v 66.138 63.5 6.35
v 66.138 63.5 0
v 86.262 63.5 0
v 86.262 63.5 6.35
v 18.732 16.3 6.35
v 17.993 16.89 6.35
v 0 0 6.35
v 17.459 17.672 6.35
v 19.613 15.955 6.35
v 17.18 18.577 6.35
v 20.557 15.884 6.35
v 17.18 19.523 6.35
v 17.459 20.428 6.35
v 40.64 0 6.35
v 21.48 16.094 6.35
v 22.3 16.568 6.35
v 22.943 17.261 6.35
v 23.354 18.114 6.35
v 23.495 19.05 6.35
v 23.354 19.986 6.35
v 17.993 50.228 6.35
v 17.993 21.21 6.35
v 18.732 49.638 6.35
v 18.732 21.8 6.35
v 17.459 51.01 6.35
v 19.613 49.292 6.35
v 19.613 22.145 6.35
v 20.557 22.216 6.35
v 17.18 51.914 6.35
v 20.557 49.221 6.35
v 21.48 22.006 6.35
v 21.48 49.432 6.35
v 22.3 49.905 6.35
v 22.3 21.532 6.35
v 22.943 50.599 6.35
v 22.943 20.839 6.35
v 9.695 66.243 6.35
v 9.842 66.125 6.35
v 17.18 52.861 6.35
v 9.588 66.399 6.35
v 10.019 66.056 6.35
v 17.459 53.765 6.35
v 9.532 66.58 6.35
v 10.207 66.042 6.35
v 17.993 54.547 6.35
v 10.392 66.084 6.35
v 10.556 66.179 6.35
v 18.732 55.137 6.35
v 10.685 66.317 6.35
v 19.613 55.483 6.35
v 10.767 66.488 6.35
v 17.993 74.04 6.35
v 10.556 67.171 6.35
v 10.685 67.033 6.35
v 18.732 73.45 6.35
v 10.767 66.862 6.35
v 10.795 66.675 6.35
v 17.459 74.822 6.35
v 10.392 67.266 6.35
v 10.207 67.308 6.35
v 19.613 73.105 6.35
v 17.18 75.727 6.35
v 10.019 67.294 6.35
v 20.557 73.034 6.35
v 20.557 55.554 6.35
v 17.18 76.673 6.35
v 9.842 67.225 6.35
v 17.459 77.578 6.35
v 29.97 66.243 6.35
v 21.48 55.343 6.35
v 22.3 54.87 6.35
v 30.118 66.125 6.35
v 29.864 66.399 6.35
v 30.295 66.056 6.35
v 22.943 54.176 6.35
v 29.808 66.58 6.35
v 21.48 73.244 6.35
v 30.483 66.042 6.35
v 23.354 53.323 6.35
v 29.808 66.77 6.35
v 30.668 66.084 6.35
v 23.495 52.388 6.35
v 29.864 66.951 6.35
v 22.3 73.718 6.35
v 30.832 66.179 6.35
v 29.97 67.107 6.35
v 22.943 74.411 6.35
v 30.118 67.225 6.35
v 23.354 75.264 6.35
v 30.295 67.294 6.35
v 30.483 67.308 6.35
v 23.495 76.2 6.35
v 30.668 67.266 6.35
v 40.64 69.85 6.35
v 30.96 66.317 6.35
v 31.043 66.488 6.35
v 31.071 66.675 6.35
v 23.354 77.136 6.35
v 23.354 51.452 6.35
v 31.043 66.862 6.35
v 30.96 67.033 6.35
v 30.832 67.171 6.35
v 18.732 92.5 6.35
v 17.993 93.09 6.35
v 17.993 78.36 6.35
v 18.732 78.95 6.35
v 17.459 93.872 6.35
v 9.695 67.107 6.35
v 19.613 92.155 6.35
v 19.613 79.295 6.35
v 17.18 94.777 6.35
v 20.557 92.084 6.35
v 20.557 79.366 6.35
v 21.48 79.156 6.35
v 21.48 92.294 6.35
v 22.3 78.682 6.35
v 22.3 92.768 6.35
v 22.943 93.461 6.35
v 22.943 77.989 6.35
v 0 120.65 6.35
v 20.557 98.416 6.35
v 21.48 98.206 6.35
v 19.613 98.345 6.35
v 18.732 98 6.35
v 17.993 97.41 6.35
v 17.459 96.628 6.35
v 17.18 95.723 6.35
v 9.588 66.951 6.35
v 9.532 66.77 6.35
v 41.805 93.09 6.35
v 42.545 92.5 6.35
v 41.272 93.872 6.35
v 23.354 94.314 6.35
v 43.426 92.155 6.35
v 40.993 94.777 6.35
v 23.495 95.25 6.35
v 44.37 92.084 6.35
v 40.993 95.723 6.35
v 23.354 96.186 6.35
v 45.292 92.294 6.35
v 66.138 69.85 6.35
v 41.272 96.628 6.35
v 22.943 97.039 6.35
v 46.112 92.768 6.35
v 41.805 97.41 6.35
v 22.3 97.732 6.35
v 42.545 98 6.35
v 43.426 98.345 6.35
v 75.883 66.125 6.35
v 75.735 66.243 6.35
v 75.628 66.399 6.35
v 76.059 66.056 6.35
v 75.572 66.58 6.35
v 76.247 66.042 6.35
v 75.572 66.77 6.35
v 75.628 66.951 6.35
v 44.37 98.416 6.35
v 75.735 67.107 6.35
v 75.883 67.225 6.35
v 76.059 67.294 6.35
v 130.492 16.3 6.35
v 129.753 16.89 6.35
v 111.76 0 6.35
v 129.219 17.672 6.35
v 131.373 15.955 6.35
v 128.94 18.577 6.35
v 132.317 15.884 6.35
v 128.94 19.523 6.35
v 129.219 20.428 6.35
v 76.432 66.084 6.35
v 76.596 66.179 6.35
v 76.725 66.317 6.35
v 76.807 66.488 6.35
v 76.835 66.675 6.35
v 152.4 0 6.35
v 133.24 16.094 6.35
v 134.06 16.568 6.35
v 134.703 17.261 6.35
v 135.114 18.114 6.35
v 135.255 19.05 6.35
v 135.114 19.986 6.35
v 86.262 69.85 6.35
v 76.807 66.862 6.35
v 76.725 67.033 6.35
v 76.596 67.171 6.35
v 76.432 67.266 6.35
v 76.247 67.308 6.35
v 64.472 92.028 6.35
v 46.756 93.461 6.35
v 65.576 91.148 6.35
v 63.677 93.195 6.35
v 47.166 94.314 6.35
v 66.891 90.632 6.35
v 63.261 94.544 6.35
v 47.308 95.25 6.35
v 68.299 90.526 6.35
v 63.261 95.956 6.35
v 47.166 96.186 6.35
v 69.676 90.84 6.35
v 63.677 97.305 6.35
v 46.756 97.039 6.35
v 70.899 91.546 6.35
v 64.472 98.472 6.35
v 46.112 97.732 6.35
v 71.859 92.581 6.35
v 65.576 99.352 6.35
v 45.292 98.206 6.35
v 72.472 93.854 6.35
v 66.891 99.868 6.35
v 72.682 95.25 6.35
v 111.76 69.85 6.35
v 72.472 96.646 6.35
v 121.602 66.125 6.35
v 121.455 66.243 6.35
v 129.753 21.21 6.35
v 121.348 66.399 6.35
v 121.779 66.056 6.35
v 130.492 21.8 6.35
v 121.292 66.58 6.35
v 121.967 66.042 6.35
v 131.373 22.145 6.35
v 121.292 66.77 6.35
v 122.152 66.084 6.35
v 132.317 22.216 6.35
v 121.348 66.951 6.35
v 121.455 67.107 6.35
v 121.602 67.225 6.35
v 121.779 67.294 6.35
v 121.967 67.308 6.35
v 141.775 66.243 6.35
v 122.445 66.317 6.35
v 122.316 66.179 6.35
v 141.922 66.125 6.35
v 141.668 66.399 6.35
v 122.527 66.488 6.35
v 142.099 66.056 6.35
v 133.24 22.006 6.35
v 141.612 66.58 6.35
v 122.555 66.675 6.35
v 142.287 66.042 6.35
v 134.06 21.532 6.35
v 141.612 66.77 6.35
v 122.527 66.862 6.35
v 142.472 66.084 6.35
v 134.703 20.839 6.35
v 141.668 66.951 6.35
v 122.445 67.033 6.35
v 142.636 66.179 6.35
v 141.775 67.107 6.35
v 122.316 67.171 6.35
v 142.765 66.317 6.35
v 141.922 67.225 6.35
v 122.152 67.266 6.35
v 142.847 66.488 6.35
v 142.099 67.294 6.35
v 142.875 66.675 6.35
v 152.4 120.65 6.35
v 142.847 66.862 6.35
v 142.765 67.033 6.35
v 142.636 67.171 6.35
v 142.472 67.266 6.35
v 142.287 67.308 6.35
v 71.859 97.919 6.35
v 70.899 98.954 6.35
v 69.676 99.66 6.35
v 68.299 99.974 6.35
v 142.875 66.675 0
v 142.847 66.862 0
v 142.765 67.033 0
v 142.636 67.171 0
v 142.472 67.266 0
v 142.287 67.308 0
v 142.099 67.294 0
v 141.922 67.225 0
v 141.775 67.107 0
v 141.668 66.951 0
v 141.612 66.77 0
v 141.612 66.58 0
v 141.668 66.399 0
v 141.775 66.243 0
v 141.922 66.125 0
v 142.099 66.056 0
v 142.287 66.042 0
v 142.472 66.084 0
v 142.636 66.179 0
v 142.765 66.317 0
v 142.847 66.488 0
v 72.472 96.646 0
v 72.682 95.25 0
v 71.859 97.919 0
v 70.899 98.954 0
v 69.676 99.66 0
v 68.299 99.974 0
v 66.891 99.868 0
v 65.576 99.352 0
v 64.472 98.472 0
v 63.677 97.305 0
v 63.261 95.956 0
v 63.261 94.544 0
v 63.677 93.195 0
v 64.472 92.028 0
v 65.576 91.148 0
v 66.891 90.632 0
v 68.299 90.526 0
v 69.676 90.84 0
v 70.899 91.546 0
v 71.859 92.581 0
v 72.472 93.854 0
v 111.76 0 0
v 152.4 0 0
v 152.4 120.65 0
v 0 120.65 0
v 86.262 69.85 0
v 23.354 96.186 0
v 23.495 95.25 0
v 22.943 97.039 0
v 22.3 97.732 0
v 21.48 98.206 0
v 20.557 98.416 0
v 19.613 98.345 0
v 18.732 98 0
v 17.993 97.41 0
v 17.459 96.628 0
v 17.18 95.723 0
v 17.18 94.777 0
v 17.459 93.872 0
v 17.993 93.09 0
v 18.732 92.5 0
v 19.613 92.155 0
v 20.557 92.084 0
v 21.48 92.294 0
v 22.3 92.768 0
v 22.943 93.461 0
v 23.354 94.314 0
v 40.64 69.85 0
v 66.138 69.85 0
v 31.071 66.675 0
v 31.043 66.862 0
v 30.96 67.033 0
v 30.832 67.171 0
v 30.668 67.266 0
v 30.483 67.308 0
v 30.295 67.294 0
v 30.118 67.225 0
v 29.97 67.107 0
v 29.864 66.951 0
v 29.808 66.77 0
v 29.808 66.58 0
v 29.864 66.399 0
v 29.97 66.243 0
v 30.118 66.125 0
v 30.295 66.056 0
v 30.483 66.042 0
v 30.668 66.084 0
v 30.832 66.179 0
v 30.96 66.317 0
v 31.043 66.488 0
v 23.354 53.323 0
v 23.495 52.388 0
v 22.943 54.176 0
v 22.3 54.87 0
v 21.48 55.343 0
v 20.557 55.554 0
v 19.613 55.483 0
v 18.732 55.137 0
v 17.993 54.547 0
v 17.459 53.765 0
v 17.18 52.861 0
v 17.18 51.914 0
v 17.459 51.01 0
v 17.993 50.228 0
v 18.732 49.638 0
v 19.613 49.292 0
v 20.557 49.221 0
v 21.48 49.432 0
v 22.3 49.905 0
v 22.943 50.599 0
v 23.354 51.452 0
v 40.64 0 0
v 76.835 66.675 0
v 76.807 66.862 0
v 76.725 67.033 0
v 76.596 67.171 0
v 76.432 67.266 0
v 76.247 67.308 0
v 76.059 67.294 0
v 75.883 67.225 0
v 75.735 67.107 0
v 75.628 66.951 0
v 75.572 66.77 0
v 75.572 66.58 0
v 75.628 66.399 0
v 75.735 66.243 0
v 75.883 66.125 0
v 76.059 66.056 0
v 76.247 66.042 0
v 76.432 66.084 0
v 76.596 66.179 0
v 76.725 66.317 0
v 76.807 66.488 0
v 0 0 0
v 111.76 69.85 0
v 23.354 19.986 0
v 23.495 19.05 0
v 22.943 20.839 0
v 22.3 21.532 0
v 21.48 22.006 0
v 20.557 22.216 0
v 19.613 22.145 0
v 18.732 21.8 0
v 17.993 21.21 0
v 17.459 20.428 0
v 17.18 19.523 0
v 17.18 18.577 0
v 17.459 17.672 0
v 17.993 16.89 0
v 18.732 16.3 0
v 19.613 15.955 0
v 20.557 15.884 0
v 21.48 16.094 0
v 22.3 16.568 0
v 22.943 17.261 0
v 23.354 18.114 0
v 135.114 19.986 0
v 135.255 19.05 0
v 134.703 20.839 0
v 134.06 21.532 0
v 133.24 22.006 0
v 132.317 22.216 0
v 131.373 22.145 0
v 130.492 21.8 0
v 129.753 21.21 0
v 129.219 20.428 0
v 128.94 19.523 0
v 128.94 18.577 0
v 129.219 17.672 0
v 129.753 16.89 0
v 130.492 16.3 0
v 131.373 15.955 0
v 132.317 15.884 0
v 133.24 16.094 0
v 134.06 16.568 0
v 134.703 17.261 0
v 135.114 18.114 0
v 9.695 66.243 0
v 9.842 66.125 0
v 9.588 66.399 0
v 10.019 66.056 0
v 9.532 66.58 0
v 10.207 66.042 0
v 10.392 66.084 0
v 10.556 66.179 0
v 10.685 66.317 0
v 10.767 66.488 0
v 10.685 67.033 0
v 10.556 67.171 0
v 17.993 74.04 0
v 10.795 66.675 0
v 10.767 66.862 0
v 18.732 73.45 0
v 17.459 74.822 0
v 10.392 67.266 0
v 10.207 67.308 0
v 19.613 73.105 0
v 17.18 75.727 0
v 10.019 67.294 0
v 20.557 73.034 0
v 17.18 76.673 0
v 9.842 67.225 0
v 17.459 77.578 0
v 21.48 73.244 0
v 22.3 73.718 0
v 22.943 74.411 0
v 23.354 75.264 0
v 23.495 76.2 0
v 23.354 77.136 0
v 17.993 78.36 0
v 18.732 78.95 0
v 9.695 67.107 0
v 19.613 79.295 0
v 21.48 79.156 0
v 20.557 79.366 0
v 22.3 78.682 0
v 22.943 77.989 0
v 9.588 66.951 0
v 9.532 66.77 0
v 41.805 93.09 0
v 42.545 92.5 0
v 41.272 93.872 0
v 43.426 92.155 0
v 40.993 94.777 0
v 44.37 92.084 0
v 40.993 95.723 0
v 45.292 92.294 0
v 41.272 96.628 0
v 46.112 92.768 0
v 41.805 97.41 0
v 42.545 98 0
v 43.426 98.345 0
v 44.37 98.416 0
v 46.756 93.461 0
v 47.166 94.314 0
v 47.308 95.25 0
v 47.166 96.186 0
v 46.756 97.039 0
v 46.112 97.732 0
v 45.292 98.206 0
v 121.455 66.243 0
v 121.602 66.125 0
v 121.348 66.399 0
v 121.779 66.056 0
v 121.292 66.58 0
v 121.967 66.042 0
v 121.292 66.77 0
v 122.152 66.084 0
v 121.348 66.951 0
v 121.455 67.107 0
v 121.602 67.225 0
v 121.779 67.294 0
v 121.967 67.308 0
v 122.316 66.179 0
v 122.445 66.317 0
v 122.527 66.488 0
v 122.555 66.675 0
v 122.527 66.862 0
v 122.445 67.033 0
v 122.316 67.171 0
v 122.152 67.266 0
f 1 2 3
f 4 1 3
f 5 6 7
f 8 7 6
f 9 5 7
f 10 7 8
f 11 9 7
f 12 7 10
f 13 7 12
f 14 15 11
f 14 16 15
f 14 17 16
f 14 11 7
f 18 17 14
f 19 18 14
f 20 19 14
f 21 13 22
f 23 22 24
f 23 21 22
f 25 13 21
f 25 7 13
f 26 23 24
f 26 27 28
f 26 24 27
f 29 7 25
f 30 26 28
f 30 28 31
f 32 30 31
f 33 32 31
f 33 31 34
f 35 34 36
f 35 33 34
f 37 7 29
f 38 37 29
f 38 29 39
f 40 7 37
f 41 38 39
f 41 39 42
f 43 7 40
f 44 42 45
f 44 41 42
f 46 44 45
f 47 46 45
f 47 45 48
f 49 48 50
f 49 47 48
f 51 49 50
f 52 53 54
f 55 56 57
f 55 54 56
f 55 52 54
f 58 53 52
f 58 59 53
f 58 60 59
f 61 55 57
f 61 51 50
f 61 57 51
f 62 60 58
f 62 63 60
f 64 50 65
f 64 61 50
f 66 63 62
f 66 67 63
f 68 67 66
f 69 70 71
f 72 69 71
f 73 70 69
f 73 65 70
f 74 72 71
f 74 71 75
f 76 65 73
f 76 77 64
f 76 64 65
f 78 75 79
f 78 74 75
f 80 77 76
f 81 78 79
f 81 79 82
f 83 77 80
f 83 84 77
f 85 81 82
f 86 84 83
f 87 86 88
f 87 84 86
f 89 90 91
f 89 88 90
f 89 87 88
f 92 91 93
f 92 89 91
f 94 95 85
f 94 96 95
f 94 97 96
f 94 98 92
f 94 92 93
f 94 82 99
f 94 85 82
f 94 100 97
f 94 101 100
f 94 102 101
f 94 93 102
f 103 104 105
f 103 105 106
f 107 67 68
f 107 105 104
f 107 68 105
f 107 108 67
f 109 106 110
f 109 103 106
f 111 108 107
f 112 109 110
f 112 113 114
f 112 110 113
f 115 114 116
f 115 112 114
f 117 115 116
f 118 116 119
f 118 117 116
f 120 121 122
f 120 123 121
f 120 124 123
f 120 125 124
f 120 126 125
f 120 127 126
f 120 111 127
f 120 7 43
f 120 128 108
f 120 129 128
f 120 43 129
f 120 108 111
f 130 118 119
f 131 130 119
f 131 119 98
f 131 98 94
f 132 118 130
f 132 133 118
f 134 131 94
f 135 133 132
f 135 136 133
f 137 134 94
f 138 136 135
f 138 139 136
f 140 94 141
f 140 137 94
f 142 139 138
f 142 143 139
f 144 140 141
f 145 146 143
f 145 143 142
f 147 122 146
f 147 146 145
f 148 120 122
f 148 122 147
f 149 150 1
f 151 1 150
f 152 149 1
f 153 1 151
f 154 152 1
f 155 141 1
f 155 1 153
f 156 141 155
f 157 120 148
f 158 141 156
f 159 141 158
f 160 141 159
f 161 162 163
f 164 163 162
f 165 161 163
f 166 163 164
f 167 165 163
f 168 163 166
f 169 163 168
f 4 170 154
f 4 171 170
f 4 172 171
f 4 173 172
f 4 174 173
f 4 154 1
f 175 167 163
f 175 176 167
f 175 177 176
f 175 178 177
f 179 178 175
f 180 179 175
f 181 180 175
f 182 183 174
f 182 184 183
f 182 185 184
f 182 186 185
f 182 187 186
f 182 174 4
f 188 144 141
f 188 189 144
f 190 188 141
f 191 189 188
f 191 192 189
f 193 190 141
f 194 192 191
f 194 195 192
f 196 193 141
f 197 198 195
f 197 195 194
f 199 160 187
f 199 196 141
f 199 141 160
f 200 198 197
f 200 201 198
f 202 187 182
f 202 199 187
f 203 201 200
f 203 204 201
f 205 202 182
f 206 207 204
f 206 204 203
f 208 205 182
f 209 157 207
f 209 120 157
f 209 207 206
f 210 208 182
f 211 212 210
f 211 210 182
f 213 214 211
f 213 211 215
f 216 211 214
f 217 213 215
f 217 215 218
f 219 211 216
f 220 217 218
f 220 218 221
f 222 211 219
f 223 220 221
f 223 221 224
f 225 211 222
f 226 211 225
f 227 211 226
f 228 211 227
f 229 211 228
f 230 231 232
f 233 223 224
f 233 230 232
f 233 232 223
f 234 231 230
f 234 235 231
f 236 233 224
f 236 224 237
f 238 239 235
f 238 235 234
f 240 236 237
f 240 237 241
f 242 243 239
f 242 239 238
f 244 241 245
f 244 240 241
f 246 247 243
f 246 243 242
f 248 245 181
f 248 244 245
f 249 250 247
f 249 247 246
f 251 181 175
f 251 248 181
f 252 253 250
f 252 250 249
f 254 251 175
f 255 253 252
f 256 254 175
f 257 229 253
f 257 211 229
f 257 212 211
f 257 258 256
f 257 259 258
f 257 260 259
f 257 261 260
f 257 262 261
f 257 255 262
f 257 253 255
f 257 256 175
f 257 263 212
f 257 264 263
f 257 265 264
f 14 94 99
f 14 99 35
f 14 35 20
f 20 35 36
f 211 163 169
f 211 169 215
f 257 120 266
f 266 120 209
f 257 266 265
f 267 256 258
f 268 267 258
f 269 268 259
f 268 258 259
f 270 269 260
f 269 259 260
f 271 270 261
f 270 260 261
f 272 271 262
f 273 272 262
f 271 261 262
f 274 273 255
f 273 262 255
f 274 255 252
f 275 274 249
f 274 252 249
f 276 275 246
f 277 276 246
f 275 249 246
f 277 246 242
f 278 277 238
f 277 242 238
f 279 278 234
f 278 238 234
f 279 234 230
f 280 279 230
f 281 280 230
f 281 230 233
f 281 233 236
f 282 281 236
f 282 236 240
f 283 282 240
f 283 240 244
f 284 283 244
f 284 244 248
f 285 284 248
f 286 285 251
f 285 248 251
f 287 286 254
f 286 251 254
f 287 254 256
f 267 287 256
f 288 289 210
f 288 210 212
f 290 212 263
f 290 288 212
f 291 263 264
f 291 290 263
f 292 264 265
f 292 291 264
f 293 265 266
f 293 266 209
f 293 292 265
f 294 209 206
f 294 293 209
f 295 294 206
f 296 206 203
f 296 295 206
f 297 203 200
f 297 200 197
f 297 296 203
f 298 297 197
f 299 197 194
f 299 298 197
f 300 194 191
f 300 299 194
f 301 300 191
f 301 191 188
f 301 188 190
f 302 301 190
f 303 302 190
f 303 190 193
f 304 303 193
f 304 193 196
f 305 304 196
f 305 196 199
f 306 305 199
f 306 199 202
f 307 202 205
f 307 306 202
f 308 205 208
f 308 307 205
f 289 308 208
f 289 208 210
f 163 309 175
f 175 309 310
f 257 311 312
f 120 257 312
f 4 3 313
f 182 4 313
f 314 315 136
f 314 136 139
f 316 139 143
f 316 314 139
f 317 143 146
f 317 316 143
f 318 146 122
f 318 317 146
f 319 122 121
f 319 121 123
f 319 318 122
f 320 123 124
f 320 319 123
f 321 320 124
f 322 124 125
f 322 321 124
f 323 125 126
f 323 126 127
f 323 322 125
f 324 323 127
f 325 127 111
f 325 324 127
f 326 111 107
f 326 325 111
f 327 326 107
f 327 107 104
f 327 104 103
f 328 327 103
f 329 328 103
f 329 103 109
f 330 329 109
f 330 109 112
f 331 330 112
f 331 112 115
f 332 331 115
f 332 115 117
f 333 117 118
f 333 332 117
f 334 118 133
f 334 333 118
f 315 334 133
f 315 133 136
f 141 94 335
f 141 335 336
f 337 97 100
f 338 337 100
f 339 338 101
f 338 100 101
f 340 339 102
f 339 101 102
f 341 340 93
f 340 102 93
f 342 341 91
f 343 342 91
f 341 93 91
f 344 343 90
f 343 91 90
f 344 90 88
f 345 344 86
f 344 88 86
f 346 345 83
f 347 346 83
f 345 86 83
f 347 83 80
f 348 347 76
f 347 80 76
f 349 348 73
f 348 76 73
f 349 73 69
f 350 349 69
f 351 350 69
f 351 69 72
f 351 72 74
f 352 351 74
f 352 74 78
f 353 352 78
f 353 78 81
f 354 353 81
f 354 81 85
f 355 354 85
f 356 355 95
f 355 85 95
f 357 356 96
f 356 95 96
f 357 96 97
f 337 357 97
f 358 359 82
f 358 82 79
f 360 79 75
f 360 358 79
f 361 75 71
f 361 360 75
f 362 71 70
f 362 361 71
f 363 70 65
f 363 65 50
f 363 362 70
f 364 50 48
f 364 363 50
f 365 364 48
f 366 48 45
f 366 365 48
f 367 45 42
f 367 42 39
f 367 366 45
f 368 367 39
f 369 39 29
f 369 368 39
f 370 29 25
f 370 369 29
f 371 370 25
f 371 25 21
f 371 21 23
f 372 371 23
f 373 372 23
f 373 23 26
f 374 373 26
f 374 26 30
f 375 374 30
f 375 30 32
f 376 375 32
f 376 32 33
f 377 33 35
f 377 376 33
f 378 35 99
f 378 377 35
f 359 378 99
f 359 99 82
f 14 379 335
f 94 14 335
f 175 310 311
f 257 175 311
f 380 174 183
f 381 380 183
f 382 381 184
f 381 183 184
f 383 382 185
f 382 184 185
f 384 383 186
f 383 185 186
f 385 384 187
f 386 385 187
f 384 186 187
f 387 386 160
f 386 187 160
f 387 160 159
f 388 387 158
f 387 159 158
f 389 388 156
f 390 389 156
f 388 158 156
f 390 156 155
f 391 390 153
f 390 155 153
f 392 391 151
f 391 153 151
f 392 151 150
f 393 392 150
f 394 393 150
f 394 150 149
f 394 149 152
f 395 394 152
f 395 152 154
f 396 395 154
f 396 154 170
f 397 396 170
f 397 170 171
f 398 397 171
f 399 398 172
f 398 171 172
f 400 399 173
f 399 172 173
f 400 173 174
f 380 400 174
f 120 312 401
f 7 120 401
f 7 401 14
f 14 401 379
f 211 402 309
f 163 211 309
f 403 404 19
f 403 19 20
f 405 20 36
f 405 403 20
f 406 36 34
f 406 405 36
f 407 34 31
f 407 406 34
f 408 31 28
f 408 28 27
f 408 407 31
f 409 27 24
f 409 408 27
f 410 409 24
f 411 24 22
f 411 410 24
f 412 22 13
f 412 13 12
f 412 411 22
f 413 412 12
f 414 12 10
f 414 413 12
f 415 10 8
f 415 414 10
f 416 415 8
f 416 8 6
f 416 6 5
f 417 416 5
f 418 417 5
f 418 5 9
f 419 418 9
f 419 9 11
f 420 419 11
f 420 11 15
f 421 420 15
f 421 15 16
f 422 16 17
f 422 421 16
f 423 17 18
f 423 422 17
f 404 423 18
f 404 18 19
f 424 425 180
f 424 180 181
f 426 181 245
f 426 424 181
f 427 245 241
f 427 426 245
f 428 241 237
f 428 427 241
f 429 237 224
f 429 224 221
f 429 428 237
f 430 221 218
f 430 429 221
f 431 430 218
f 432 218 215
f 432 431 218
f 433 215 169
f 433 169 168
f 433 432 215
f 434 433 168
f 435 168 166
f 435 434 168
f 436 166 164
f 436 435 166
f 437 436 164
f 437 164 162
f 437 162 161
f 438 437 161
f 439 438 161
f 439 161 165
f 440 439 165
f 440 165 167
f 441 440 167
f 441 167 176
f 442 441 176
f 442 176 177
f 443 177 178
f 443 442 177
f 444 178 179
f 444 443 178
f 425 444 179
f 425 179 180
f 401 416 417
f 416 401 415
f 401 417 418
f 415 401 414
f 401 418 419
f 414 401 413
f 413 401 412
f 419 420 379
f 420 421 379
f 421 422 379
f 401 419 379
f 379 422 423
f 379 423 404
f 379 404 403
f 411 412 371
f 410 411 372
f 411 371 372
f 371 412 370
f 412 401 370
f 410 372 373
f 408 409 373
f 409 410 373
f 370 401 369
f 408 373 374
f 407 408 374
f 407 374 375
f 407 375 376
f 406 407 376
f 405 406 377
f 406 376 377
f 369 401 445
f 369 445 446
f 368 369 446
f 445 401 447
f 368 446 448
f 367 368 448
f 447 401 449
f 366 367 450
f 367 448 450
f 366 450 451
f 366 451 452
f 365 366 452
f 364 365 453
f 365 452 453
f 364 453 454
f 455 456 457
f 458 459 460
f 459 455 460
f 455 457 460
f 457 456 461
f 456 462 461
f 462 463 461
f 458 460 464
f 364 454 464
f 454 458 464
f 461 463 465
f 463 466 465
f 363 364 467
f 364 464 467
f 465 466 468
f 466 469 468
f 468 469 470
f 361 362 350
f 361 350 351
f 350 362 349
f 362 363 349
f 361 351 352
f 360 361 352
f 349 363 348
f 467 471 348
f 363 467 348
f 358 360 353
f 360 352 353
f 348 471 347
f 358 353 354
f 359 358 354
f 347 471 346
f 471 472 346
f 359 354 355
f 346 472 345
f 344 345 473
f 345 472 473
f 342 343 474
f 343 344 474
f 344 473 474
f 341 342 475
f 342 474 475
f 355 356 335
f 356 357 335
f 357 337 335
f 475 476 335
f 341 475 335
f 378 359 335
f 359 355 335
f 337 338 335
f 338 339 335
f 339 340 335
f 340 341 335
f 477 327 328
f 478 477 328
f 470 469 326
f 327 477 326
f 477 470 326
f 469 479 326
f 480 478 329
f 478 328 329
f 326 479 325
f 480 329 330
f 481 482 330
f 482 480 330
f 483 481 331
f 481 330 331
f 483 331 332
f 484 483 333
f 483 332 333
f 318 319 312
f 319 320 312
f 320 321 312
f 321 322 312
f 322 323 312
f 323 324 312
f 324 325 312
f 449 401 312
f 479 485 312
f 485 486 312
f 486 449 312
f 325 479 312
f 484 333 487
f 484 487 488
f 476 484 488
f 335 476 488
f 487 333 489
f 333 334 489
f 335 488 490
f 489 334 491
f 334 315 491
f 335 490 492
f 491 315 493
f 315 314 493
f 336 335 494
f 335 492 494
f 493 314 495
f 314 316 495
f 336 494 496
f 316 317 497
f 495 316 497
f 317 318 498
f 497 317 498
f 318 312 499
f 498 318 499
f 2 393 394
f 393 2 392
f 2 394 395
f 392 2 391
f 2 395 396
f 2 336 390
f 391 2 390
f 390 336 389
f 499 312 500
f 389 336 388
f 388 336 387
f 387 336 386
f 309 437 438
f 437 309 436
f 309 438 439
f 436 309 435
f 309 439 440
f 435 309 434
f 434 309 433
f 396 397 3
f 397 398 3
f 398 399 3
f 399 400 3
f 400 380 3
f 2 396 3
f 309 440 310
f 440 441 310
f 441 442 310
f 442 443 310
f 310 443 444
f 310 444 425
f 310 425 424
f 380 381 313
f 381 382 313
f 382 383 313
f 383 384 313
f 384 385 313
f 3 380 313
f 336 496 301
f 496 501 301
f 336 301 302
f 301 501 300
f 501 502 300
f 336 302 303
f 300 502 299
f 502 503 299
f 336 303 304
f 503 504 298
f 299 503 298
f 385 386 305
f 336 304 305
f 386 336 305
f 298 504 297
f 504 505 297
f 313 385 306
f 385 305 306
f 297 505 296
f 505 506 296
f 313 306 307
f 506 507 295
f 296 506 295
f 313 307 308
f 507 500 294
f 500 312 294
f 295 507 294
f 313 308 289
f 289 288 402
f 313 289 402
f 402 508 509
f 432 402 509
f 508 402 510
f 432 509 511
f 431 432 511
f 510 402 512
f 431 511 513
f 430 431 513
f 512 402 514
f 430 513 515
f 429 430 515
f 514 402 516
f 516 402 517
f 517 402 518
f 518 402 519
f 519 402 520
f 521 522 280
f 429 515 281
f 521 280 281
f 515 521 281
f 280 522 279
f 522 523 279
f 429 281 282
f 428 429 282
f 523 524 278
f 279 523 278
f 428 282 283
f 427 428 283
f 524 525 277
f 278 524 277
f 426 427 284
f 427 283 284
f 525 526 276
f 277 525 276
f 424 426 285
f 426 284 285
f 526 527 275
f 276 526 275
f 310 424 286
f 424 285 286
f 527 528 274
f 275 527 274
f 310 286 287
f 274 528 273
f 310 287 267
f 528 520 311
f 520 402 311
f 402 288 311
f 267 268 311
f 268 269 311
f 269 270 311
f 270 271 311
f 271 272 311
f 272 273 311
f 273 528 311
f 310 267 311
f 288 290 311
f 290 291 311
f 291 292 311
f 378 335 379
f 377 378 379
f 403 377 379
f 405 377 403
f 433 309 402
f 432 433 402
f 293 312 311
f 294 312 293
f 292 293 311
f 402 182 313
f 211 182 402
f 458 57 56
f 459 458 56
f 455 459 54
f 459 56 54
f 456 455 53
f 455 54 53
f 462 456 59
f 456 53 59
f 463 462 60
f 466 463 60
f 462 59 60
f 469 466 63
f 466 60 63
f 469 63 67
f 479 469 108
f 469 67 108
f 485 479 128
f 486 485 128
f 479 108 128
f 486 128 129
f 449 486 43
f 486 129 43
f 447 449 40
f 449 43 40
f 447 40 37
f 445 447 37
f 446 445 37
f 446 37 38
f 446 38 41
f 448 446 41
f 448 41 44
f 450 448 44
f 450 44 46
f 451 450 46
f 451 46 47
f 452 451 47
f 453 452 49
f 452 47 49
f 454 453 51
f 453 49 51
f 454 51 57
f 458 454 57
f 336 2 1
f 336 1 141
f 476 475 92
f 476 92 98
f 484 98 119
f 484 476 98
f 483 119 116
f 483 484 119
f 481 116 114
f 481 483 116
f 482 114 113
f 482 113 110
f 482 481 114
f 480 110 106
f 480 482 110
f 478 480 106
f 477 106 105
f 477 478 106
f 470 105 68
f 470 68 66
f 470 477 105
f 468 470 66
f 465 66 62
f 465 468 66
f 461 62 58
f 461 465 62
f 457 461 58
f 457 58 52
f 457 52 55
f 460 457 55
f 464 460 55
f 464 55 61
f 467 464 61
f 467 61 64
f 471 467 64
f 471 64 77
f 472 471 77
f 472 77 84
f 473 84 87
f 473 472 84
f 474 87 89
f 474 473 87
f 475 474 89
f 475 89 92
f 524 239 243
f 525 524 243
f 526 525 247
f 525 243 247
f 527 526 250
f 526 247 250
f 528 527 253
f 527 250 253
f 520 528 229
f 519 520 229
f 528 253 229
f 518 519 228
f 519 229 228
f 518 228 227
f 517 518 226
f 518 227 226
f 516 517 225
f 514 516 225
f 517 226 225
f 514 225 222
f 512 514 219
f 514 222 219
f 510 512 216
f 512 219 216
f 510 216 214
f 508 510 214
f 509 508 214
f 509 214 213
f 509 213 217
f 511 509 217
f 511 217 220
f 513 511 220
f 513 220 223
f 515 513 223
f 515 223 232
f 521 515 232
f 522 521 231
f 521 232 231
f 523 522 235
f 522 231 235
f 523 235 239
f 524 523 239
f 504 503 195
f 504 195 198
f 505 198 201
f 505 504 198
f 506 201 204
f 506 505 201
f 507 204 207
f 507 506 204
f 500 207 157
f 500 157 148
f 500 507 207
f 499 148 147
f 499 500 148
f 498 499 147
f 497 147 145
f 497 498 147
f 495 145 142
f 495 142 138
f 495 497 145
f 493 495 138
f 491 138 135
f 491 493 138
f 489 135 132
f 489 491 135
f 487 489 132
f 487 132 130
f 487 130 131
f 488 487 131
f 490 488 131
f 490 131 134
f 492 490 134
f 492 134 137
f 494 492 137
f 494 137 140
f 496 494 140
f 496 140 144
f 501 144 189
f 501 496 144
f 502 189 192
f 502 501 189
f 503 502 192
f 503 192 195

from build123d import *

# Parameters (mm, degrees)
SKETCH1_R           = 3.175
SKETCH1_R_2         = 4.7371
BOSS_EXTRUDE1_DEPTH = 6.35
SKETCH2_W           = 25.498289586
SKETCH2_H           = 6.35
CUT_EXTRUDE1_DEPTH  = 6.35
SKETCH4_R           = 0.635
CUT_EXTRUDE3_DEPTH  = 6.35
SKETCH6_R           = 0.635
CUT_EXTRUDE4_DEPTH  = 6.35


with BuildPart() as part:
    # Sketch1 → Boss-Extrude1 (new body)
    with BuildSketch(Plane.XY):
        Polygon((0, 0), (40.64, 0), (40.64, 63.5), (111.76, 63.5), (111.76, 0), (152.4, 0), (152.4, 69.85), (152.4, 120.65), (111.76, 120.65), (40.64, 120.65), (0, 120.65), (0, 69.85), align=None)
        with Locations((20.32, 95.25)):
            Circle(SKETCH1_R, mode=Mode.SUBTRACT)
        with Locations((67.945, 95.25)):
            Circle(SKETCH1_R_2, mode=Mode.SUBTRACT)
        with Locations((132.08, 19.05)):
            Circle(SKETCH1_R, mode=Mode.SUBTRACT)
        with Locations((20.32, 76.2)):
            Circle(SKETCH1_R, mode=Mode.SUBTRACT)
        with Locations((20.32, 52.3875)):
            Circle(SKETCH1_R, mode=Mode.SUBTRACT)
        with Locations((20.32, 19.05)):
            Circle(SKETCH1_R, mode=Mode.SUBTRACT)
        with Locations((44.1325, 95.25)):
            Circle(SKETCH1_R, mode=Mode.SUBTRACT)
    extrude(amount=BOSS_EXTRUDE1_DEPTH)

    # Sketch2 → Cut-Extrude1 (cut)
    with BuildSketch(Plane.XY.offset(6.35)):
        with Locations((53.389144793, 66.675)):
            Rectangle(SKETCH2_W, SKETCH2_H)
        with Locations((99.010855207, 66.675)):
            Rectangle(SKETCH2_W, SKETCH2_H)
    extrude(amount=-CUT_EXTRUDE1_DEPTH, mode=Mode.SUBTRACT)

    # Sketch4 → Cut-Extrude3 (cut)
    with BuildSketch(Plane.XY.offset(6.35)):
        with Locations((76.2, 66.675)):
            Circle(SKETCH4_R)
    extrude(amount=-CUT_EXTRUDE3_DEPTH, mode=Mode.SUBTRACT)

    # Sketch6 → Cut-Extrude4 (cut)
    with BuildSketch(Plane.XY.offset(6.35)):
        with Locations((10.16, 66.675)):
            Circle(SKETCH6_R)
        with Locations((30.435806054, 66.675)):
            Circle(SKETCH6_R)
        with Locations((121.92, 66.675)):
            Circle(SKETCH6_R)
        with Locations((142.24, 66.675)):
            Circle(SKETCH6_R)
    extrude(amount=-CUT_EXTRUDE4_DEPTH, mode=Mode.SUBTRACT)


solid = part.part
